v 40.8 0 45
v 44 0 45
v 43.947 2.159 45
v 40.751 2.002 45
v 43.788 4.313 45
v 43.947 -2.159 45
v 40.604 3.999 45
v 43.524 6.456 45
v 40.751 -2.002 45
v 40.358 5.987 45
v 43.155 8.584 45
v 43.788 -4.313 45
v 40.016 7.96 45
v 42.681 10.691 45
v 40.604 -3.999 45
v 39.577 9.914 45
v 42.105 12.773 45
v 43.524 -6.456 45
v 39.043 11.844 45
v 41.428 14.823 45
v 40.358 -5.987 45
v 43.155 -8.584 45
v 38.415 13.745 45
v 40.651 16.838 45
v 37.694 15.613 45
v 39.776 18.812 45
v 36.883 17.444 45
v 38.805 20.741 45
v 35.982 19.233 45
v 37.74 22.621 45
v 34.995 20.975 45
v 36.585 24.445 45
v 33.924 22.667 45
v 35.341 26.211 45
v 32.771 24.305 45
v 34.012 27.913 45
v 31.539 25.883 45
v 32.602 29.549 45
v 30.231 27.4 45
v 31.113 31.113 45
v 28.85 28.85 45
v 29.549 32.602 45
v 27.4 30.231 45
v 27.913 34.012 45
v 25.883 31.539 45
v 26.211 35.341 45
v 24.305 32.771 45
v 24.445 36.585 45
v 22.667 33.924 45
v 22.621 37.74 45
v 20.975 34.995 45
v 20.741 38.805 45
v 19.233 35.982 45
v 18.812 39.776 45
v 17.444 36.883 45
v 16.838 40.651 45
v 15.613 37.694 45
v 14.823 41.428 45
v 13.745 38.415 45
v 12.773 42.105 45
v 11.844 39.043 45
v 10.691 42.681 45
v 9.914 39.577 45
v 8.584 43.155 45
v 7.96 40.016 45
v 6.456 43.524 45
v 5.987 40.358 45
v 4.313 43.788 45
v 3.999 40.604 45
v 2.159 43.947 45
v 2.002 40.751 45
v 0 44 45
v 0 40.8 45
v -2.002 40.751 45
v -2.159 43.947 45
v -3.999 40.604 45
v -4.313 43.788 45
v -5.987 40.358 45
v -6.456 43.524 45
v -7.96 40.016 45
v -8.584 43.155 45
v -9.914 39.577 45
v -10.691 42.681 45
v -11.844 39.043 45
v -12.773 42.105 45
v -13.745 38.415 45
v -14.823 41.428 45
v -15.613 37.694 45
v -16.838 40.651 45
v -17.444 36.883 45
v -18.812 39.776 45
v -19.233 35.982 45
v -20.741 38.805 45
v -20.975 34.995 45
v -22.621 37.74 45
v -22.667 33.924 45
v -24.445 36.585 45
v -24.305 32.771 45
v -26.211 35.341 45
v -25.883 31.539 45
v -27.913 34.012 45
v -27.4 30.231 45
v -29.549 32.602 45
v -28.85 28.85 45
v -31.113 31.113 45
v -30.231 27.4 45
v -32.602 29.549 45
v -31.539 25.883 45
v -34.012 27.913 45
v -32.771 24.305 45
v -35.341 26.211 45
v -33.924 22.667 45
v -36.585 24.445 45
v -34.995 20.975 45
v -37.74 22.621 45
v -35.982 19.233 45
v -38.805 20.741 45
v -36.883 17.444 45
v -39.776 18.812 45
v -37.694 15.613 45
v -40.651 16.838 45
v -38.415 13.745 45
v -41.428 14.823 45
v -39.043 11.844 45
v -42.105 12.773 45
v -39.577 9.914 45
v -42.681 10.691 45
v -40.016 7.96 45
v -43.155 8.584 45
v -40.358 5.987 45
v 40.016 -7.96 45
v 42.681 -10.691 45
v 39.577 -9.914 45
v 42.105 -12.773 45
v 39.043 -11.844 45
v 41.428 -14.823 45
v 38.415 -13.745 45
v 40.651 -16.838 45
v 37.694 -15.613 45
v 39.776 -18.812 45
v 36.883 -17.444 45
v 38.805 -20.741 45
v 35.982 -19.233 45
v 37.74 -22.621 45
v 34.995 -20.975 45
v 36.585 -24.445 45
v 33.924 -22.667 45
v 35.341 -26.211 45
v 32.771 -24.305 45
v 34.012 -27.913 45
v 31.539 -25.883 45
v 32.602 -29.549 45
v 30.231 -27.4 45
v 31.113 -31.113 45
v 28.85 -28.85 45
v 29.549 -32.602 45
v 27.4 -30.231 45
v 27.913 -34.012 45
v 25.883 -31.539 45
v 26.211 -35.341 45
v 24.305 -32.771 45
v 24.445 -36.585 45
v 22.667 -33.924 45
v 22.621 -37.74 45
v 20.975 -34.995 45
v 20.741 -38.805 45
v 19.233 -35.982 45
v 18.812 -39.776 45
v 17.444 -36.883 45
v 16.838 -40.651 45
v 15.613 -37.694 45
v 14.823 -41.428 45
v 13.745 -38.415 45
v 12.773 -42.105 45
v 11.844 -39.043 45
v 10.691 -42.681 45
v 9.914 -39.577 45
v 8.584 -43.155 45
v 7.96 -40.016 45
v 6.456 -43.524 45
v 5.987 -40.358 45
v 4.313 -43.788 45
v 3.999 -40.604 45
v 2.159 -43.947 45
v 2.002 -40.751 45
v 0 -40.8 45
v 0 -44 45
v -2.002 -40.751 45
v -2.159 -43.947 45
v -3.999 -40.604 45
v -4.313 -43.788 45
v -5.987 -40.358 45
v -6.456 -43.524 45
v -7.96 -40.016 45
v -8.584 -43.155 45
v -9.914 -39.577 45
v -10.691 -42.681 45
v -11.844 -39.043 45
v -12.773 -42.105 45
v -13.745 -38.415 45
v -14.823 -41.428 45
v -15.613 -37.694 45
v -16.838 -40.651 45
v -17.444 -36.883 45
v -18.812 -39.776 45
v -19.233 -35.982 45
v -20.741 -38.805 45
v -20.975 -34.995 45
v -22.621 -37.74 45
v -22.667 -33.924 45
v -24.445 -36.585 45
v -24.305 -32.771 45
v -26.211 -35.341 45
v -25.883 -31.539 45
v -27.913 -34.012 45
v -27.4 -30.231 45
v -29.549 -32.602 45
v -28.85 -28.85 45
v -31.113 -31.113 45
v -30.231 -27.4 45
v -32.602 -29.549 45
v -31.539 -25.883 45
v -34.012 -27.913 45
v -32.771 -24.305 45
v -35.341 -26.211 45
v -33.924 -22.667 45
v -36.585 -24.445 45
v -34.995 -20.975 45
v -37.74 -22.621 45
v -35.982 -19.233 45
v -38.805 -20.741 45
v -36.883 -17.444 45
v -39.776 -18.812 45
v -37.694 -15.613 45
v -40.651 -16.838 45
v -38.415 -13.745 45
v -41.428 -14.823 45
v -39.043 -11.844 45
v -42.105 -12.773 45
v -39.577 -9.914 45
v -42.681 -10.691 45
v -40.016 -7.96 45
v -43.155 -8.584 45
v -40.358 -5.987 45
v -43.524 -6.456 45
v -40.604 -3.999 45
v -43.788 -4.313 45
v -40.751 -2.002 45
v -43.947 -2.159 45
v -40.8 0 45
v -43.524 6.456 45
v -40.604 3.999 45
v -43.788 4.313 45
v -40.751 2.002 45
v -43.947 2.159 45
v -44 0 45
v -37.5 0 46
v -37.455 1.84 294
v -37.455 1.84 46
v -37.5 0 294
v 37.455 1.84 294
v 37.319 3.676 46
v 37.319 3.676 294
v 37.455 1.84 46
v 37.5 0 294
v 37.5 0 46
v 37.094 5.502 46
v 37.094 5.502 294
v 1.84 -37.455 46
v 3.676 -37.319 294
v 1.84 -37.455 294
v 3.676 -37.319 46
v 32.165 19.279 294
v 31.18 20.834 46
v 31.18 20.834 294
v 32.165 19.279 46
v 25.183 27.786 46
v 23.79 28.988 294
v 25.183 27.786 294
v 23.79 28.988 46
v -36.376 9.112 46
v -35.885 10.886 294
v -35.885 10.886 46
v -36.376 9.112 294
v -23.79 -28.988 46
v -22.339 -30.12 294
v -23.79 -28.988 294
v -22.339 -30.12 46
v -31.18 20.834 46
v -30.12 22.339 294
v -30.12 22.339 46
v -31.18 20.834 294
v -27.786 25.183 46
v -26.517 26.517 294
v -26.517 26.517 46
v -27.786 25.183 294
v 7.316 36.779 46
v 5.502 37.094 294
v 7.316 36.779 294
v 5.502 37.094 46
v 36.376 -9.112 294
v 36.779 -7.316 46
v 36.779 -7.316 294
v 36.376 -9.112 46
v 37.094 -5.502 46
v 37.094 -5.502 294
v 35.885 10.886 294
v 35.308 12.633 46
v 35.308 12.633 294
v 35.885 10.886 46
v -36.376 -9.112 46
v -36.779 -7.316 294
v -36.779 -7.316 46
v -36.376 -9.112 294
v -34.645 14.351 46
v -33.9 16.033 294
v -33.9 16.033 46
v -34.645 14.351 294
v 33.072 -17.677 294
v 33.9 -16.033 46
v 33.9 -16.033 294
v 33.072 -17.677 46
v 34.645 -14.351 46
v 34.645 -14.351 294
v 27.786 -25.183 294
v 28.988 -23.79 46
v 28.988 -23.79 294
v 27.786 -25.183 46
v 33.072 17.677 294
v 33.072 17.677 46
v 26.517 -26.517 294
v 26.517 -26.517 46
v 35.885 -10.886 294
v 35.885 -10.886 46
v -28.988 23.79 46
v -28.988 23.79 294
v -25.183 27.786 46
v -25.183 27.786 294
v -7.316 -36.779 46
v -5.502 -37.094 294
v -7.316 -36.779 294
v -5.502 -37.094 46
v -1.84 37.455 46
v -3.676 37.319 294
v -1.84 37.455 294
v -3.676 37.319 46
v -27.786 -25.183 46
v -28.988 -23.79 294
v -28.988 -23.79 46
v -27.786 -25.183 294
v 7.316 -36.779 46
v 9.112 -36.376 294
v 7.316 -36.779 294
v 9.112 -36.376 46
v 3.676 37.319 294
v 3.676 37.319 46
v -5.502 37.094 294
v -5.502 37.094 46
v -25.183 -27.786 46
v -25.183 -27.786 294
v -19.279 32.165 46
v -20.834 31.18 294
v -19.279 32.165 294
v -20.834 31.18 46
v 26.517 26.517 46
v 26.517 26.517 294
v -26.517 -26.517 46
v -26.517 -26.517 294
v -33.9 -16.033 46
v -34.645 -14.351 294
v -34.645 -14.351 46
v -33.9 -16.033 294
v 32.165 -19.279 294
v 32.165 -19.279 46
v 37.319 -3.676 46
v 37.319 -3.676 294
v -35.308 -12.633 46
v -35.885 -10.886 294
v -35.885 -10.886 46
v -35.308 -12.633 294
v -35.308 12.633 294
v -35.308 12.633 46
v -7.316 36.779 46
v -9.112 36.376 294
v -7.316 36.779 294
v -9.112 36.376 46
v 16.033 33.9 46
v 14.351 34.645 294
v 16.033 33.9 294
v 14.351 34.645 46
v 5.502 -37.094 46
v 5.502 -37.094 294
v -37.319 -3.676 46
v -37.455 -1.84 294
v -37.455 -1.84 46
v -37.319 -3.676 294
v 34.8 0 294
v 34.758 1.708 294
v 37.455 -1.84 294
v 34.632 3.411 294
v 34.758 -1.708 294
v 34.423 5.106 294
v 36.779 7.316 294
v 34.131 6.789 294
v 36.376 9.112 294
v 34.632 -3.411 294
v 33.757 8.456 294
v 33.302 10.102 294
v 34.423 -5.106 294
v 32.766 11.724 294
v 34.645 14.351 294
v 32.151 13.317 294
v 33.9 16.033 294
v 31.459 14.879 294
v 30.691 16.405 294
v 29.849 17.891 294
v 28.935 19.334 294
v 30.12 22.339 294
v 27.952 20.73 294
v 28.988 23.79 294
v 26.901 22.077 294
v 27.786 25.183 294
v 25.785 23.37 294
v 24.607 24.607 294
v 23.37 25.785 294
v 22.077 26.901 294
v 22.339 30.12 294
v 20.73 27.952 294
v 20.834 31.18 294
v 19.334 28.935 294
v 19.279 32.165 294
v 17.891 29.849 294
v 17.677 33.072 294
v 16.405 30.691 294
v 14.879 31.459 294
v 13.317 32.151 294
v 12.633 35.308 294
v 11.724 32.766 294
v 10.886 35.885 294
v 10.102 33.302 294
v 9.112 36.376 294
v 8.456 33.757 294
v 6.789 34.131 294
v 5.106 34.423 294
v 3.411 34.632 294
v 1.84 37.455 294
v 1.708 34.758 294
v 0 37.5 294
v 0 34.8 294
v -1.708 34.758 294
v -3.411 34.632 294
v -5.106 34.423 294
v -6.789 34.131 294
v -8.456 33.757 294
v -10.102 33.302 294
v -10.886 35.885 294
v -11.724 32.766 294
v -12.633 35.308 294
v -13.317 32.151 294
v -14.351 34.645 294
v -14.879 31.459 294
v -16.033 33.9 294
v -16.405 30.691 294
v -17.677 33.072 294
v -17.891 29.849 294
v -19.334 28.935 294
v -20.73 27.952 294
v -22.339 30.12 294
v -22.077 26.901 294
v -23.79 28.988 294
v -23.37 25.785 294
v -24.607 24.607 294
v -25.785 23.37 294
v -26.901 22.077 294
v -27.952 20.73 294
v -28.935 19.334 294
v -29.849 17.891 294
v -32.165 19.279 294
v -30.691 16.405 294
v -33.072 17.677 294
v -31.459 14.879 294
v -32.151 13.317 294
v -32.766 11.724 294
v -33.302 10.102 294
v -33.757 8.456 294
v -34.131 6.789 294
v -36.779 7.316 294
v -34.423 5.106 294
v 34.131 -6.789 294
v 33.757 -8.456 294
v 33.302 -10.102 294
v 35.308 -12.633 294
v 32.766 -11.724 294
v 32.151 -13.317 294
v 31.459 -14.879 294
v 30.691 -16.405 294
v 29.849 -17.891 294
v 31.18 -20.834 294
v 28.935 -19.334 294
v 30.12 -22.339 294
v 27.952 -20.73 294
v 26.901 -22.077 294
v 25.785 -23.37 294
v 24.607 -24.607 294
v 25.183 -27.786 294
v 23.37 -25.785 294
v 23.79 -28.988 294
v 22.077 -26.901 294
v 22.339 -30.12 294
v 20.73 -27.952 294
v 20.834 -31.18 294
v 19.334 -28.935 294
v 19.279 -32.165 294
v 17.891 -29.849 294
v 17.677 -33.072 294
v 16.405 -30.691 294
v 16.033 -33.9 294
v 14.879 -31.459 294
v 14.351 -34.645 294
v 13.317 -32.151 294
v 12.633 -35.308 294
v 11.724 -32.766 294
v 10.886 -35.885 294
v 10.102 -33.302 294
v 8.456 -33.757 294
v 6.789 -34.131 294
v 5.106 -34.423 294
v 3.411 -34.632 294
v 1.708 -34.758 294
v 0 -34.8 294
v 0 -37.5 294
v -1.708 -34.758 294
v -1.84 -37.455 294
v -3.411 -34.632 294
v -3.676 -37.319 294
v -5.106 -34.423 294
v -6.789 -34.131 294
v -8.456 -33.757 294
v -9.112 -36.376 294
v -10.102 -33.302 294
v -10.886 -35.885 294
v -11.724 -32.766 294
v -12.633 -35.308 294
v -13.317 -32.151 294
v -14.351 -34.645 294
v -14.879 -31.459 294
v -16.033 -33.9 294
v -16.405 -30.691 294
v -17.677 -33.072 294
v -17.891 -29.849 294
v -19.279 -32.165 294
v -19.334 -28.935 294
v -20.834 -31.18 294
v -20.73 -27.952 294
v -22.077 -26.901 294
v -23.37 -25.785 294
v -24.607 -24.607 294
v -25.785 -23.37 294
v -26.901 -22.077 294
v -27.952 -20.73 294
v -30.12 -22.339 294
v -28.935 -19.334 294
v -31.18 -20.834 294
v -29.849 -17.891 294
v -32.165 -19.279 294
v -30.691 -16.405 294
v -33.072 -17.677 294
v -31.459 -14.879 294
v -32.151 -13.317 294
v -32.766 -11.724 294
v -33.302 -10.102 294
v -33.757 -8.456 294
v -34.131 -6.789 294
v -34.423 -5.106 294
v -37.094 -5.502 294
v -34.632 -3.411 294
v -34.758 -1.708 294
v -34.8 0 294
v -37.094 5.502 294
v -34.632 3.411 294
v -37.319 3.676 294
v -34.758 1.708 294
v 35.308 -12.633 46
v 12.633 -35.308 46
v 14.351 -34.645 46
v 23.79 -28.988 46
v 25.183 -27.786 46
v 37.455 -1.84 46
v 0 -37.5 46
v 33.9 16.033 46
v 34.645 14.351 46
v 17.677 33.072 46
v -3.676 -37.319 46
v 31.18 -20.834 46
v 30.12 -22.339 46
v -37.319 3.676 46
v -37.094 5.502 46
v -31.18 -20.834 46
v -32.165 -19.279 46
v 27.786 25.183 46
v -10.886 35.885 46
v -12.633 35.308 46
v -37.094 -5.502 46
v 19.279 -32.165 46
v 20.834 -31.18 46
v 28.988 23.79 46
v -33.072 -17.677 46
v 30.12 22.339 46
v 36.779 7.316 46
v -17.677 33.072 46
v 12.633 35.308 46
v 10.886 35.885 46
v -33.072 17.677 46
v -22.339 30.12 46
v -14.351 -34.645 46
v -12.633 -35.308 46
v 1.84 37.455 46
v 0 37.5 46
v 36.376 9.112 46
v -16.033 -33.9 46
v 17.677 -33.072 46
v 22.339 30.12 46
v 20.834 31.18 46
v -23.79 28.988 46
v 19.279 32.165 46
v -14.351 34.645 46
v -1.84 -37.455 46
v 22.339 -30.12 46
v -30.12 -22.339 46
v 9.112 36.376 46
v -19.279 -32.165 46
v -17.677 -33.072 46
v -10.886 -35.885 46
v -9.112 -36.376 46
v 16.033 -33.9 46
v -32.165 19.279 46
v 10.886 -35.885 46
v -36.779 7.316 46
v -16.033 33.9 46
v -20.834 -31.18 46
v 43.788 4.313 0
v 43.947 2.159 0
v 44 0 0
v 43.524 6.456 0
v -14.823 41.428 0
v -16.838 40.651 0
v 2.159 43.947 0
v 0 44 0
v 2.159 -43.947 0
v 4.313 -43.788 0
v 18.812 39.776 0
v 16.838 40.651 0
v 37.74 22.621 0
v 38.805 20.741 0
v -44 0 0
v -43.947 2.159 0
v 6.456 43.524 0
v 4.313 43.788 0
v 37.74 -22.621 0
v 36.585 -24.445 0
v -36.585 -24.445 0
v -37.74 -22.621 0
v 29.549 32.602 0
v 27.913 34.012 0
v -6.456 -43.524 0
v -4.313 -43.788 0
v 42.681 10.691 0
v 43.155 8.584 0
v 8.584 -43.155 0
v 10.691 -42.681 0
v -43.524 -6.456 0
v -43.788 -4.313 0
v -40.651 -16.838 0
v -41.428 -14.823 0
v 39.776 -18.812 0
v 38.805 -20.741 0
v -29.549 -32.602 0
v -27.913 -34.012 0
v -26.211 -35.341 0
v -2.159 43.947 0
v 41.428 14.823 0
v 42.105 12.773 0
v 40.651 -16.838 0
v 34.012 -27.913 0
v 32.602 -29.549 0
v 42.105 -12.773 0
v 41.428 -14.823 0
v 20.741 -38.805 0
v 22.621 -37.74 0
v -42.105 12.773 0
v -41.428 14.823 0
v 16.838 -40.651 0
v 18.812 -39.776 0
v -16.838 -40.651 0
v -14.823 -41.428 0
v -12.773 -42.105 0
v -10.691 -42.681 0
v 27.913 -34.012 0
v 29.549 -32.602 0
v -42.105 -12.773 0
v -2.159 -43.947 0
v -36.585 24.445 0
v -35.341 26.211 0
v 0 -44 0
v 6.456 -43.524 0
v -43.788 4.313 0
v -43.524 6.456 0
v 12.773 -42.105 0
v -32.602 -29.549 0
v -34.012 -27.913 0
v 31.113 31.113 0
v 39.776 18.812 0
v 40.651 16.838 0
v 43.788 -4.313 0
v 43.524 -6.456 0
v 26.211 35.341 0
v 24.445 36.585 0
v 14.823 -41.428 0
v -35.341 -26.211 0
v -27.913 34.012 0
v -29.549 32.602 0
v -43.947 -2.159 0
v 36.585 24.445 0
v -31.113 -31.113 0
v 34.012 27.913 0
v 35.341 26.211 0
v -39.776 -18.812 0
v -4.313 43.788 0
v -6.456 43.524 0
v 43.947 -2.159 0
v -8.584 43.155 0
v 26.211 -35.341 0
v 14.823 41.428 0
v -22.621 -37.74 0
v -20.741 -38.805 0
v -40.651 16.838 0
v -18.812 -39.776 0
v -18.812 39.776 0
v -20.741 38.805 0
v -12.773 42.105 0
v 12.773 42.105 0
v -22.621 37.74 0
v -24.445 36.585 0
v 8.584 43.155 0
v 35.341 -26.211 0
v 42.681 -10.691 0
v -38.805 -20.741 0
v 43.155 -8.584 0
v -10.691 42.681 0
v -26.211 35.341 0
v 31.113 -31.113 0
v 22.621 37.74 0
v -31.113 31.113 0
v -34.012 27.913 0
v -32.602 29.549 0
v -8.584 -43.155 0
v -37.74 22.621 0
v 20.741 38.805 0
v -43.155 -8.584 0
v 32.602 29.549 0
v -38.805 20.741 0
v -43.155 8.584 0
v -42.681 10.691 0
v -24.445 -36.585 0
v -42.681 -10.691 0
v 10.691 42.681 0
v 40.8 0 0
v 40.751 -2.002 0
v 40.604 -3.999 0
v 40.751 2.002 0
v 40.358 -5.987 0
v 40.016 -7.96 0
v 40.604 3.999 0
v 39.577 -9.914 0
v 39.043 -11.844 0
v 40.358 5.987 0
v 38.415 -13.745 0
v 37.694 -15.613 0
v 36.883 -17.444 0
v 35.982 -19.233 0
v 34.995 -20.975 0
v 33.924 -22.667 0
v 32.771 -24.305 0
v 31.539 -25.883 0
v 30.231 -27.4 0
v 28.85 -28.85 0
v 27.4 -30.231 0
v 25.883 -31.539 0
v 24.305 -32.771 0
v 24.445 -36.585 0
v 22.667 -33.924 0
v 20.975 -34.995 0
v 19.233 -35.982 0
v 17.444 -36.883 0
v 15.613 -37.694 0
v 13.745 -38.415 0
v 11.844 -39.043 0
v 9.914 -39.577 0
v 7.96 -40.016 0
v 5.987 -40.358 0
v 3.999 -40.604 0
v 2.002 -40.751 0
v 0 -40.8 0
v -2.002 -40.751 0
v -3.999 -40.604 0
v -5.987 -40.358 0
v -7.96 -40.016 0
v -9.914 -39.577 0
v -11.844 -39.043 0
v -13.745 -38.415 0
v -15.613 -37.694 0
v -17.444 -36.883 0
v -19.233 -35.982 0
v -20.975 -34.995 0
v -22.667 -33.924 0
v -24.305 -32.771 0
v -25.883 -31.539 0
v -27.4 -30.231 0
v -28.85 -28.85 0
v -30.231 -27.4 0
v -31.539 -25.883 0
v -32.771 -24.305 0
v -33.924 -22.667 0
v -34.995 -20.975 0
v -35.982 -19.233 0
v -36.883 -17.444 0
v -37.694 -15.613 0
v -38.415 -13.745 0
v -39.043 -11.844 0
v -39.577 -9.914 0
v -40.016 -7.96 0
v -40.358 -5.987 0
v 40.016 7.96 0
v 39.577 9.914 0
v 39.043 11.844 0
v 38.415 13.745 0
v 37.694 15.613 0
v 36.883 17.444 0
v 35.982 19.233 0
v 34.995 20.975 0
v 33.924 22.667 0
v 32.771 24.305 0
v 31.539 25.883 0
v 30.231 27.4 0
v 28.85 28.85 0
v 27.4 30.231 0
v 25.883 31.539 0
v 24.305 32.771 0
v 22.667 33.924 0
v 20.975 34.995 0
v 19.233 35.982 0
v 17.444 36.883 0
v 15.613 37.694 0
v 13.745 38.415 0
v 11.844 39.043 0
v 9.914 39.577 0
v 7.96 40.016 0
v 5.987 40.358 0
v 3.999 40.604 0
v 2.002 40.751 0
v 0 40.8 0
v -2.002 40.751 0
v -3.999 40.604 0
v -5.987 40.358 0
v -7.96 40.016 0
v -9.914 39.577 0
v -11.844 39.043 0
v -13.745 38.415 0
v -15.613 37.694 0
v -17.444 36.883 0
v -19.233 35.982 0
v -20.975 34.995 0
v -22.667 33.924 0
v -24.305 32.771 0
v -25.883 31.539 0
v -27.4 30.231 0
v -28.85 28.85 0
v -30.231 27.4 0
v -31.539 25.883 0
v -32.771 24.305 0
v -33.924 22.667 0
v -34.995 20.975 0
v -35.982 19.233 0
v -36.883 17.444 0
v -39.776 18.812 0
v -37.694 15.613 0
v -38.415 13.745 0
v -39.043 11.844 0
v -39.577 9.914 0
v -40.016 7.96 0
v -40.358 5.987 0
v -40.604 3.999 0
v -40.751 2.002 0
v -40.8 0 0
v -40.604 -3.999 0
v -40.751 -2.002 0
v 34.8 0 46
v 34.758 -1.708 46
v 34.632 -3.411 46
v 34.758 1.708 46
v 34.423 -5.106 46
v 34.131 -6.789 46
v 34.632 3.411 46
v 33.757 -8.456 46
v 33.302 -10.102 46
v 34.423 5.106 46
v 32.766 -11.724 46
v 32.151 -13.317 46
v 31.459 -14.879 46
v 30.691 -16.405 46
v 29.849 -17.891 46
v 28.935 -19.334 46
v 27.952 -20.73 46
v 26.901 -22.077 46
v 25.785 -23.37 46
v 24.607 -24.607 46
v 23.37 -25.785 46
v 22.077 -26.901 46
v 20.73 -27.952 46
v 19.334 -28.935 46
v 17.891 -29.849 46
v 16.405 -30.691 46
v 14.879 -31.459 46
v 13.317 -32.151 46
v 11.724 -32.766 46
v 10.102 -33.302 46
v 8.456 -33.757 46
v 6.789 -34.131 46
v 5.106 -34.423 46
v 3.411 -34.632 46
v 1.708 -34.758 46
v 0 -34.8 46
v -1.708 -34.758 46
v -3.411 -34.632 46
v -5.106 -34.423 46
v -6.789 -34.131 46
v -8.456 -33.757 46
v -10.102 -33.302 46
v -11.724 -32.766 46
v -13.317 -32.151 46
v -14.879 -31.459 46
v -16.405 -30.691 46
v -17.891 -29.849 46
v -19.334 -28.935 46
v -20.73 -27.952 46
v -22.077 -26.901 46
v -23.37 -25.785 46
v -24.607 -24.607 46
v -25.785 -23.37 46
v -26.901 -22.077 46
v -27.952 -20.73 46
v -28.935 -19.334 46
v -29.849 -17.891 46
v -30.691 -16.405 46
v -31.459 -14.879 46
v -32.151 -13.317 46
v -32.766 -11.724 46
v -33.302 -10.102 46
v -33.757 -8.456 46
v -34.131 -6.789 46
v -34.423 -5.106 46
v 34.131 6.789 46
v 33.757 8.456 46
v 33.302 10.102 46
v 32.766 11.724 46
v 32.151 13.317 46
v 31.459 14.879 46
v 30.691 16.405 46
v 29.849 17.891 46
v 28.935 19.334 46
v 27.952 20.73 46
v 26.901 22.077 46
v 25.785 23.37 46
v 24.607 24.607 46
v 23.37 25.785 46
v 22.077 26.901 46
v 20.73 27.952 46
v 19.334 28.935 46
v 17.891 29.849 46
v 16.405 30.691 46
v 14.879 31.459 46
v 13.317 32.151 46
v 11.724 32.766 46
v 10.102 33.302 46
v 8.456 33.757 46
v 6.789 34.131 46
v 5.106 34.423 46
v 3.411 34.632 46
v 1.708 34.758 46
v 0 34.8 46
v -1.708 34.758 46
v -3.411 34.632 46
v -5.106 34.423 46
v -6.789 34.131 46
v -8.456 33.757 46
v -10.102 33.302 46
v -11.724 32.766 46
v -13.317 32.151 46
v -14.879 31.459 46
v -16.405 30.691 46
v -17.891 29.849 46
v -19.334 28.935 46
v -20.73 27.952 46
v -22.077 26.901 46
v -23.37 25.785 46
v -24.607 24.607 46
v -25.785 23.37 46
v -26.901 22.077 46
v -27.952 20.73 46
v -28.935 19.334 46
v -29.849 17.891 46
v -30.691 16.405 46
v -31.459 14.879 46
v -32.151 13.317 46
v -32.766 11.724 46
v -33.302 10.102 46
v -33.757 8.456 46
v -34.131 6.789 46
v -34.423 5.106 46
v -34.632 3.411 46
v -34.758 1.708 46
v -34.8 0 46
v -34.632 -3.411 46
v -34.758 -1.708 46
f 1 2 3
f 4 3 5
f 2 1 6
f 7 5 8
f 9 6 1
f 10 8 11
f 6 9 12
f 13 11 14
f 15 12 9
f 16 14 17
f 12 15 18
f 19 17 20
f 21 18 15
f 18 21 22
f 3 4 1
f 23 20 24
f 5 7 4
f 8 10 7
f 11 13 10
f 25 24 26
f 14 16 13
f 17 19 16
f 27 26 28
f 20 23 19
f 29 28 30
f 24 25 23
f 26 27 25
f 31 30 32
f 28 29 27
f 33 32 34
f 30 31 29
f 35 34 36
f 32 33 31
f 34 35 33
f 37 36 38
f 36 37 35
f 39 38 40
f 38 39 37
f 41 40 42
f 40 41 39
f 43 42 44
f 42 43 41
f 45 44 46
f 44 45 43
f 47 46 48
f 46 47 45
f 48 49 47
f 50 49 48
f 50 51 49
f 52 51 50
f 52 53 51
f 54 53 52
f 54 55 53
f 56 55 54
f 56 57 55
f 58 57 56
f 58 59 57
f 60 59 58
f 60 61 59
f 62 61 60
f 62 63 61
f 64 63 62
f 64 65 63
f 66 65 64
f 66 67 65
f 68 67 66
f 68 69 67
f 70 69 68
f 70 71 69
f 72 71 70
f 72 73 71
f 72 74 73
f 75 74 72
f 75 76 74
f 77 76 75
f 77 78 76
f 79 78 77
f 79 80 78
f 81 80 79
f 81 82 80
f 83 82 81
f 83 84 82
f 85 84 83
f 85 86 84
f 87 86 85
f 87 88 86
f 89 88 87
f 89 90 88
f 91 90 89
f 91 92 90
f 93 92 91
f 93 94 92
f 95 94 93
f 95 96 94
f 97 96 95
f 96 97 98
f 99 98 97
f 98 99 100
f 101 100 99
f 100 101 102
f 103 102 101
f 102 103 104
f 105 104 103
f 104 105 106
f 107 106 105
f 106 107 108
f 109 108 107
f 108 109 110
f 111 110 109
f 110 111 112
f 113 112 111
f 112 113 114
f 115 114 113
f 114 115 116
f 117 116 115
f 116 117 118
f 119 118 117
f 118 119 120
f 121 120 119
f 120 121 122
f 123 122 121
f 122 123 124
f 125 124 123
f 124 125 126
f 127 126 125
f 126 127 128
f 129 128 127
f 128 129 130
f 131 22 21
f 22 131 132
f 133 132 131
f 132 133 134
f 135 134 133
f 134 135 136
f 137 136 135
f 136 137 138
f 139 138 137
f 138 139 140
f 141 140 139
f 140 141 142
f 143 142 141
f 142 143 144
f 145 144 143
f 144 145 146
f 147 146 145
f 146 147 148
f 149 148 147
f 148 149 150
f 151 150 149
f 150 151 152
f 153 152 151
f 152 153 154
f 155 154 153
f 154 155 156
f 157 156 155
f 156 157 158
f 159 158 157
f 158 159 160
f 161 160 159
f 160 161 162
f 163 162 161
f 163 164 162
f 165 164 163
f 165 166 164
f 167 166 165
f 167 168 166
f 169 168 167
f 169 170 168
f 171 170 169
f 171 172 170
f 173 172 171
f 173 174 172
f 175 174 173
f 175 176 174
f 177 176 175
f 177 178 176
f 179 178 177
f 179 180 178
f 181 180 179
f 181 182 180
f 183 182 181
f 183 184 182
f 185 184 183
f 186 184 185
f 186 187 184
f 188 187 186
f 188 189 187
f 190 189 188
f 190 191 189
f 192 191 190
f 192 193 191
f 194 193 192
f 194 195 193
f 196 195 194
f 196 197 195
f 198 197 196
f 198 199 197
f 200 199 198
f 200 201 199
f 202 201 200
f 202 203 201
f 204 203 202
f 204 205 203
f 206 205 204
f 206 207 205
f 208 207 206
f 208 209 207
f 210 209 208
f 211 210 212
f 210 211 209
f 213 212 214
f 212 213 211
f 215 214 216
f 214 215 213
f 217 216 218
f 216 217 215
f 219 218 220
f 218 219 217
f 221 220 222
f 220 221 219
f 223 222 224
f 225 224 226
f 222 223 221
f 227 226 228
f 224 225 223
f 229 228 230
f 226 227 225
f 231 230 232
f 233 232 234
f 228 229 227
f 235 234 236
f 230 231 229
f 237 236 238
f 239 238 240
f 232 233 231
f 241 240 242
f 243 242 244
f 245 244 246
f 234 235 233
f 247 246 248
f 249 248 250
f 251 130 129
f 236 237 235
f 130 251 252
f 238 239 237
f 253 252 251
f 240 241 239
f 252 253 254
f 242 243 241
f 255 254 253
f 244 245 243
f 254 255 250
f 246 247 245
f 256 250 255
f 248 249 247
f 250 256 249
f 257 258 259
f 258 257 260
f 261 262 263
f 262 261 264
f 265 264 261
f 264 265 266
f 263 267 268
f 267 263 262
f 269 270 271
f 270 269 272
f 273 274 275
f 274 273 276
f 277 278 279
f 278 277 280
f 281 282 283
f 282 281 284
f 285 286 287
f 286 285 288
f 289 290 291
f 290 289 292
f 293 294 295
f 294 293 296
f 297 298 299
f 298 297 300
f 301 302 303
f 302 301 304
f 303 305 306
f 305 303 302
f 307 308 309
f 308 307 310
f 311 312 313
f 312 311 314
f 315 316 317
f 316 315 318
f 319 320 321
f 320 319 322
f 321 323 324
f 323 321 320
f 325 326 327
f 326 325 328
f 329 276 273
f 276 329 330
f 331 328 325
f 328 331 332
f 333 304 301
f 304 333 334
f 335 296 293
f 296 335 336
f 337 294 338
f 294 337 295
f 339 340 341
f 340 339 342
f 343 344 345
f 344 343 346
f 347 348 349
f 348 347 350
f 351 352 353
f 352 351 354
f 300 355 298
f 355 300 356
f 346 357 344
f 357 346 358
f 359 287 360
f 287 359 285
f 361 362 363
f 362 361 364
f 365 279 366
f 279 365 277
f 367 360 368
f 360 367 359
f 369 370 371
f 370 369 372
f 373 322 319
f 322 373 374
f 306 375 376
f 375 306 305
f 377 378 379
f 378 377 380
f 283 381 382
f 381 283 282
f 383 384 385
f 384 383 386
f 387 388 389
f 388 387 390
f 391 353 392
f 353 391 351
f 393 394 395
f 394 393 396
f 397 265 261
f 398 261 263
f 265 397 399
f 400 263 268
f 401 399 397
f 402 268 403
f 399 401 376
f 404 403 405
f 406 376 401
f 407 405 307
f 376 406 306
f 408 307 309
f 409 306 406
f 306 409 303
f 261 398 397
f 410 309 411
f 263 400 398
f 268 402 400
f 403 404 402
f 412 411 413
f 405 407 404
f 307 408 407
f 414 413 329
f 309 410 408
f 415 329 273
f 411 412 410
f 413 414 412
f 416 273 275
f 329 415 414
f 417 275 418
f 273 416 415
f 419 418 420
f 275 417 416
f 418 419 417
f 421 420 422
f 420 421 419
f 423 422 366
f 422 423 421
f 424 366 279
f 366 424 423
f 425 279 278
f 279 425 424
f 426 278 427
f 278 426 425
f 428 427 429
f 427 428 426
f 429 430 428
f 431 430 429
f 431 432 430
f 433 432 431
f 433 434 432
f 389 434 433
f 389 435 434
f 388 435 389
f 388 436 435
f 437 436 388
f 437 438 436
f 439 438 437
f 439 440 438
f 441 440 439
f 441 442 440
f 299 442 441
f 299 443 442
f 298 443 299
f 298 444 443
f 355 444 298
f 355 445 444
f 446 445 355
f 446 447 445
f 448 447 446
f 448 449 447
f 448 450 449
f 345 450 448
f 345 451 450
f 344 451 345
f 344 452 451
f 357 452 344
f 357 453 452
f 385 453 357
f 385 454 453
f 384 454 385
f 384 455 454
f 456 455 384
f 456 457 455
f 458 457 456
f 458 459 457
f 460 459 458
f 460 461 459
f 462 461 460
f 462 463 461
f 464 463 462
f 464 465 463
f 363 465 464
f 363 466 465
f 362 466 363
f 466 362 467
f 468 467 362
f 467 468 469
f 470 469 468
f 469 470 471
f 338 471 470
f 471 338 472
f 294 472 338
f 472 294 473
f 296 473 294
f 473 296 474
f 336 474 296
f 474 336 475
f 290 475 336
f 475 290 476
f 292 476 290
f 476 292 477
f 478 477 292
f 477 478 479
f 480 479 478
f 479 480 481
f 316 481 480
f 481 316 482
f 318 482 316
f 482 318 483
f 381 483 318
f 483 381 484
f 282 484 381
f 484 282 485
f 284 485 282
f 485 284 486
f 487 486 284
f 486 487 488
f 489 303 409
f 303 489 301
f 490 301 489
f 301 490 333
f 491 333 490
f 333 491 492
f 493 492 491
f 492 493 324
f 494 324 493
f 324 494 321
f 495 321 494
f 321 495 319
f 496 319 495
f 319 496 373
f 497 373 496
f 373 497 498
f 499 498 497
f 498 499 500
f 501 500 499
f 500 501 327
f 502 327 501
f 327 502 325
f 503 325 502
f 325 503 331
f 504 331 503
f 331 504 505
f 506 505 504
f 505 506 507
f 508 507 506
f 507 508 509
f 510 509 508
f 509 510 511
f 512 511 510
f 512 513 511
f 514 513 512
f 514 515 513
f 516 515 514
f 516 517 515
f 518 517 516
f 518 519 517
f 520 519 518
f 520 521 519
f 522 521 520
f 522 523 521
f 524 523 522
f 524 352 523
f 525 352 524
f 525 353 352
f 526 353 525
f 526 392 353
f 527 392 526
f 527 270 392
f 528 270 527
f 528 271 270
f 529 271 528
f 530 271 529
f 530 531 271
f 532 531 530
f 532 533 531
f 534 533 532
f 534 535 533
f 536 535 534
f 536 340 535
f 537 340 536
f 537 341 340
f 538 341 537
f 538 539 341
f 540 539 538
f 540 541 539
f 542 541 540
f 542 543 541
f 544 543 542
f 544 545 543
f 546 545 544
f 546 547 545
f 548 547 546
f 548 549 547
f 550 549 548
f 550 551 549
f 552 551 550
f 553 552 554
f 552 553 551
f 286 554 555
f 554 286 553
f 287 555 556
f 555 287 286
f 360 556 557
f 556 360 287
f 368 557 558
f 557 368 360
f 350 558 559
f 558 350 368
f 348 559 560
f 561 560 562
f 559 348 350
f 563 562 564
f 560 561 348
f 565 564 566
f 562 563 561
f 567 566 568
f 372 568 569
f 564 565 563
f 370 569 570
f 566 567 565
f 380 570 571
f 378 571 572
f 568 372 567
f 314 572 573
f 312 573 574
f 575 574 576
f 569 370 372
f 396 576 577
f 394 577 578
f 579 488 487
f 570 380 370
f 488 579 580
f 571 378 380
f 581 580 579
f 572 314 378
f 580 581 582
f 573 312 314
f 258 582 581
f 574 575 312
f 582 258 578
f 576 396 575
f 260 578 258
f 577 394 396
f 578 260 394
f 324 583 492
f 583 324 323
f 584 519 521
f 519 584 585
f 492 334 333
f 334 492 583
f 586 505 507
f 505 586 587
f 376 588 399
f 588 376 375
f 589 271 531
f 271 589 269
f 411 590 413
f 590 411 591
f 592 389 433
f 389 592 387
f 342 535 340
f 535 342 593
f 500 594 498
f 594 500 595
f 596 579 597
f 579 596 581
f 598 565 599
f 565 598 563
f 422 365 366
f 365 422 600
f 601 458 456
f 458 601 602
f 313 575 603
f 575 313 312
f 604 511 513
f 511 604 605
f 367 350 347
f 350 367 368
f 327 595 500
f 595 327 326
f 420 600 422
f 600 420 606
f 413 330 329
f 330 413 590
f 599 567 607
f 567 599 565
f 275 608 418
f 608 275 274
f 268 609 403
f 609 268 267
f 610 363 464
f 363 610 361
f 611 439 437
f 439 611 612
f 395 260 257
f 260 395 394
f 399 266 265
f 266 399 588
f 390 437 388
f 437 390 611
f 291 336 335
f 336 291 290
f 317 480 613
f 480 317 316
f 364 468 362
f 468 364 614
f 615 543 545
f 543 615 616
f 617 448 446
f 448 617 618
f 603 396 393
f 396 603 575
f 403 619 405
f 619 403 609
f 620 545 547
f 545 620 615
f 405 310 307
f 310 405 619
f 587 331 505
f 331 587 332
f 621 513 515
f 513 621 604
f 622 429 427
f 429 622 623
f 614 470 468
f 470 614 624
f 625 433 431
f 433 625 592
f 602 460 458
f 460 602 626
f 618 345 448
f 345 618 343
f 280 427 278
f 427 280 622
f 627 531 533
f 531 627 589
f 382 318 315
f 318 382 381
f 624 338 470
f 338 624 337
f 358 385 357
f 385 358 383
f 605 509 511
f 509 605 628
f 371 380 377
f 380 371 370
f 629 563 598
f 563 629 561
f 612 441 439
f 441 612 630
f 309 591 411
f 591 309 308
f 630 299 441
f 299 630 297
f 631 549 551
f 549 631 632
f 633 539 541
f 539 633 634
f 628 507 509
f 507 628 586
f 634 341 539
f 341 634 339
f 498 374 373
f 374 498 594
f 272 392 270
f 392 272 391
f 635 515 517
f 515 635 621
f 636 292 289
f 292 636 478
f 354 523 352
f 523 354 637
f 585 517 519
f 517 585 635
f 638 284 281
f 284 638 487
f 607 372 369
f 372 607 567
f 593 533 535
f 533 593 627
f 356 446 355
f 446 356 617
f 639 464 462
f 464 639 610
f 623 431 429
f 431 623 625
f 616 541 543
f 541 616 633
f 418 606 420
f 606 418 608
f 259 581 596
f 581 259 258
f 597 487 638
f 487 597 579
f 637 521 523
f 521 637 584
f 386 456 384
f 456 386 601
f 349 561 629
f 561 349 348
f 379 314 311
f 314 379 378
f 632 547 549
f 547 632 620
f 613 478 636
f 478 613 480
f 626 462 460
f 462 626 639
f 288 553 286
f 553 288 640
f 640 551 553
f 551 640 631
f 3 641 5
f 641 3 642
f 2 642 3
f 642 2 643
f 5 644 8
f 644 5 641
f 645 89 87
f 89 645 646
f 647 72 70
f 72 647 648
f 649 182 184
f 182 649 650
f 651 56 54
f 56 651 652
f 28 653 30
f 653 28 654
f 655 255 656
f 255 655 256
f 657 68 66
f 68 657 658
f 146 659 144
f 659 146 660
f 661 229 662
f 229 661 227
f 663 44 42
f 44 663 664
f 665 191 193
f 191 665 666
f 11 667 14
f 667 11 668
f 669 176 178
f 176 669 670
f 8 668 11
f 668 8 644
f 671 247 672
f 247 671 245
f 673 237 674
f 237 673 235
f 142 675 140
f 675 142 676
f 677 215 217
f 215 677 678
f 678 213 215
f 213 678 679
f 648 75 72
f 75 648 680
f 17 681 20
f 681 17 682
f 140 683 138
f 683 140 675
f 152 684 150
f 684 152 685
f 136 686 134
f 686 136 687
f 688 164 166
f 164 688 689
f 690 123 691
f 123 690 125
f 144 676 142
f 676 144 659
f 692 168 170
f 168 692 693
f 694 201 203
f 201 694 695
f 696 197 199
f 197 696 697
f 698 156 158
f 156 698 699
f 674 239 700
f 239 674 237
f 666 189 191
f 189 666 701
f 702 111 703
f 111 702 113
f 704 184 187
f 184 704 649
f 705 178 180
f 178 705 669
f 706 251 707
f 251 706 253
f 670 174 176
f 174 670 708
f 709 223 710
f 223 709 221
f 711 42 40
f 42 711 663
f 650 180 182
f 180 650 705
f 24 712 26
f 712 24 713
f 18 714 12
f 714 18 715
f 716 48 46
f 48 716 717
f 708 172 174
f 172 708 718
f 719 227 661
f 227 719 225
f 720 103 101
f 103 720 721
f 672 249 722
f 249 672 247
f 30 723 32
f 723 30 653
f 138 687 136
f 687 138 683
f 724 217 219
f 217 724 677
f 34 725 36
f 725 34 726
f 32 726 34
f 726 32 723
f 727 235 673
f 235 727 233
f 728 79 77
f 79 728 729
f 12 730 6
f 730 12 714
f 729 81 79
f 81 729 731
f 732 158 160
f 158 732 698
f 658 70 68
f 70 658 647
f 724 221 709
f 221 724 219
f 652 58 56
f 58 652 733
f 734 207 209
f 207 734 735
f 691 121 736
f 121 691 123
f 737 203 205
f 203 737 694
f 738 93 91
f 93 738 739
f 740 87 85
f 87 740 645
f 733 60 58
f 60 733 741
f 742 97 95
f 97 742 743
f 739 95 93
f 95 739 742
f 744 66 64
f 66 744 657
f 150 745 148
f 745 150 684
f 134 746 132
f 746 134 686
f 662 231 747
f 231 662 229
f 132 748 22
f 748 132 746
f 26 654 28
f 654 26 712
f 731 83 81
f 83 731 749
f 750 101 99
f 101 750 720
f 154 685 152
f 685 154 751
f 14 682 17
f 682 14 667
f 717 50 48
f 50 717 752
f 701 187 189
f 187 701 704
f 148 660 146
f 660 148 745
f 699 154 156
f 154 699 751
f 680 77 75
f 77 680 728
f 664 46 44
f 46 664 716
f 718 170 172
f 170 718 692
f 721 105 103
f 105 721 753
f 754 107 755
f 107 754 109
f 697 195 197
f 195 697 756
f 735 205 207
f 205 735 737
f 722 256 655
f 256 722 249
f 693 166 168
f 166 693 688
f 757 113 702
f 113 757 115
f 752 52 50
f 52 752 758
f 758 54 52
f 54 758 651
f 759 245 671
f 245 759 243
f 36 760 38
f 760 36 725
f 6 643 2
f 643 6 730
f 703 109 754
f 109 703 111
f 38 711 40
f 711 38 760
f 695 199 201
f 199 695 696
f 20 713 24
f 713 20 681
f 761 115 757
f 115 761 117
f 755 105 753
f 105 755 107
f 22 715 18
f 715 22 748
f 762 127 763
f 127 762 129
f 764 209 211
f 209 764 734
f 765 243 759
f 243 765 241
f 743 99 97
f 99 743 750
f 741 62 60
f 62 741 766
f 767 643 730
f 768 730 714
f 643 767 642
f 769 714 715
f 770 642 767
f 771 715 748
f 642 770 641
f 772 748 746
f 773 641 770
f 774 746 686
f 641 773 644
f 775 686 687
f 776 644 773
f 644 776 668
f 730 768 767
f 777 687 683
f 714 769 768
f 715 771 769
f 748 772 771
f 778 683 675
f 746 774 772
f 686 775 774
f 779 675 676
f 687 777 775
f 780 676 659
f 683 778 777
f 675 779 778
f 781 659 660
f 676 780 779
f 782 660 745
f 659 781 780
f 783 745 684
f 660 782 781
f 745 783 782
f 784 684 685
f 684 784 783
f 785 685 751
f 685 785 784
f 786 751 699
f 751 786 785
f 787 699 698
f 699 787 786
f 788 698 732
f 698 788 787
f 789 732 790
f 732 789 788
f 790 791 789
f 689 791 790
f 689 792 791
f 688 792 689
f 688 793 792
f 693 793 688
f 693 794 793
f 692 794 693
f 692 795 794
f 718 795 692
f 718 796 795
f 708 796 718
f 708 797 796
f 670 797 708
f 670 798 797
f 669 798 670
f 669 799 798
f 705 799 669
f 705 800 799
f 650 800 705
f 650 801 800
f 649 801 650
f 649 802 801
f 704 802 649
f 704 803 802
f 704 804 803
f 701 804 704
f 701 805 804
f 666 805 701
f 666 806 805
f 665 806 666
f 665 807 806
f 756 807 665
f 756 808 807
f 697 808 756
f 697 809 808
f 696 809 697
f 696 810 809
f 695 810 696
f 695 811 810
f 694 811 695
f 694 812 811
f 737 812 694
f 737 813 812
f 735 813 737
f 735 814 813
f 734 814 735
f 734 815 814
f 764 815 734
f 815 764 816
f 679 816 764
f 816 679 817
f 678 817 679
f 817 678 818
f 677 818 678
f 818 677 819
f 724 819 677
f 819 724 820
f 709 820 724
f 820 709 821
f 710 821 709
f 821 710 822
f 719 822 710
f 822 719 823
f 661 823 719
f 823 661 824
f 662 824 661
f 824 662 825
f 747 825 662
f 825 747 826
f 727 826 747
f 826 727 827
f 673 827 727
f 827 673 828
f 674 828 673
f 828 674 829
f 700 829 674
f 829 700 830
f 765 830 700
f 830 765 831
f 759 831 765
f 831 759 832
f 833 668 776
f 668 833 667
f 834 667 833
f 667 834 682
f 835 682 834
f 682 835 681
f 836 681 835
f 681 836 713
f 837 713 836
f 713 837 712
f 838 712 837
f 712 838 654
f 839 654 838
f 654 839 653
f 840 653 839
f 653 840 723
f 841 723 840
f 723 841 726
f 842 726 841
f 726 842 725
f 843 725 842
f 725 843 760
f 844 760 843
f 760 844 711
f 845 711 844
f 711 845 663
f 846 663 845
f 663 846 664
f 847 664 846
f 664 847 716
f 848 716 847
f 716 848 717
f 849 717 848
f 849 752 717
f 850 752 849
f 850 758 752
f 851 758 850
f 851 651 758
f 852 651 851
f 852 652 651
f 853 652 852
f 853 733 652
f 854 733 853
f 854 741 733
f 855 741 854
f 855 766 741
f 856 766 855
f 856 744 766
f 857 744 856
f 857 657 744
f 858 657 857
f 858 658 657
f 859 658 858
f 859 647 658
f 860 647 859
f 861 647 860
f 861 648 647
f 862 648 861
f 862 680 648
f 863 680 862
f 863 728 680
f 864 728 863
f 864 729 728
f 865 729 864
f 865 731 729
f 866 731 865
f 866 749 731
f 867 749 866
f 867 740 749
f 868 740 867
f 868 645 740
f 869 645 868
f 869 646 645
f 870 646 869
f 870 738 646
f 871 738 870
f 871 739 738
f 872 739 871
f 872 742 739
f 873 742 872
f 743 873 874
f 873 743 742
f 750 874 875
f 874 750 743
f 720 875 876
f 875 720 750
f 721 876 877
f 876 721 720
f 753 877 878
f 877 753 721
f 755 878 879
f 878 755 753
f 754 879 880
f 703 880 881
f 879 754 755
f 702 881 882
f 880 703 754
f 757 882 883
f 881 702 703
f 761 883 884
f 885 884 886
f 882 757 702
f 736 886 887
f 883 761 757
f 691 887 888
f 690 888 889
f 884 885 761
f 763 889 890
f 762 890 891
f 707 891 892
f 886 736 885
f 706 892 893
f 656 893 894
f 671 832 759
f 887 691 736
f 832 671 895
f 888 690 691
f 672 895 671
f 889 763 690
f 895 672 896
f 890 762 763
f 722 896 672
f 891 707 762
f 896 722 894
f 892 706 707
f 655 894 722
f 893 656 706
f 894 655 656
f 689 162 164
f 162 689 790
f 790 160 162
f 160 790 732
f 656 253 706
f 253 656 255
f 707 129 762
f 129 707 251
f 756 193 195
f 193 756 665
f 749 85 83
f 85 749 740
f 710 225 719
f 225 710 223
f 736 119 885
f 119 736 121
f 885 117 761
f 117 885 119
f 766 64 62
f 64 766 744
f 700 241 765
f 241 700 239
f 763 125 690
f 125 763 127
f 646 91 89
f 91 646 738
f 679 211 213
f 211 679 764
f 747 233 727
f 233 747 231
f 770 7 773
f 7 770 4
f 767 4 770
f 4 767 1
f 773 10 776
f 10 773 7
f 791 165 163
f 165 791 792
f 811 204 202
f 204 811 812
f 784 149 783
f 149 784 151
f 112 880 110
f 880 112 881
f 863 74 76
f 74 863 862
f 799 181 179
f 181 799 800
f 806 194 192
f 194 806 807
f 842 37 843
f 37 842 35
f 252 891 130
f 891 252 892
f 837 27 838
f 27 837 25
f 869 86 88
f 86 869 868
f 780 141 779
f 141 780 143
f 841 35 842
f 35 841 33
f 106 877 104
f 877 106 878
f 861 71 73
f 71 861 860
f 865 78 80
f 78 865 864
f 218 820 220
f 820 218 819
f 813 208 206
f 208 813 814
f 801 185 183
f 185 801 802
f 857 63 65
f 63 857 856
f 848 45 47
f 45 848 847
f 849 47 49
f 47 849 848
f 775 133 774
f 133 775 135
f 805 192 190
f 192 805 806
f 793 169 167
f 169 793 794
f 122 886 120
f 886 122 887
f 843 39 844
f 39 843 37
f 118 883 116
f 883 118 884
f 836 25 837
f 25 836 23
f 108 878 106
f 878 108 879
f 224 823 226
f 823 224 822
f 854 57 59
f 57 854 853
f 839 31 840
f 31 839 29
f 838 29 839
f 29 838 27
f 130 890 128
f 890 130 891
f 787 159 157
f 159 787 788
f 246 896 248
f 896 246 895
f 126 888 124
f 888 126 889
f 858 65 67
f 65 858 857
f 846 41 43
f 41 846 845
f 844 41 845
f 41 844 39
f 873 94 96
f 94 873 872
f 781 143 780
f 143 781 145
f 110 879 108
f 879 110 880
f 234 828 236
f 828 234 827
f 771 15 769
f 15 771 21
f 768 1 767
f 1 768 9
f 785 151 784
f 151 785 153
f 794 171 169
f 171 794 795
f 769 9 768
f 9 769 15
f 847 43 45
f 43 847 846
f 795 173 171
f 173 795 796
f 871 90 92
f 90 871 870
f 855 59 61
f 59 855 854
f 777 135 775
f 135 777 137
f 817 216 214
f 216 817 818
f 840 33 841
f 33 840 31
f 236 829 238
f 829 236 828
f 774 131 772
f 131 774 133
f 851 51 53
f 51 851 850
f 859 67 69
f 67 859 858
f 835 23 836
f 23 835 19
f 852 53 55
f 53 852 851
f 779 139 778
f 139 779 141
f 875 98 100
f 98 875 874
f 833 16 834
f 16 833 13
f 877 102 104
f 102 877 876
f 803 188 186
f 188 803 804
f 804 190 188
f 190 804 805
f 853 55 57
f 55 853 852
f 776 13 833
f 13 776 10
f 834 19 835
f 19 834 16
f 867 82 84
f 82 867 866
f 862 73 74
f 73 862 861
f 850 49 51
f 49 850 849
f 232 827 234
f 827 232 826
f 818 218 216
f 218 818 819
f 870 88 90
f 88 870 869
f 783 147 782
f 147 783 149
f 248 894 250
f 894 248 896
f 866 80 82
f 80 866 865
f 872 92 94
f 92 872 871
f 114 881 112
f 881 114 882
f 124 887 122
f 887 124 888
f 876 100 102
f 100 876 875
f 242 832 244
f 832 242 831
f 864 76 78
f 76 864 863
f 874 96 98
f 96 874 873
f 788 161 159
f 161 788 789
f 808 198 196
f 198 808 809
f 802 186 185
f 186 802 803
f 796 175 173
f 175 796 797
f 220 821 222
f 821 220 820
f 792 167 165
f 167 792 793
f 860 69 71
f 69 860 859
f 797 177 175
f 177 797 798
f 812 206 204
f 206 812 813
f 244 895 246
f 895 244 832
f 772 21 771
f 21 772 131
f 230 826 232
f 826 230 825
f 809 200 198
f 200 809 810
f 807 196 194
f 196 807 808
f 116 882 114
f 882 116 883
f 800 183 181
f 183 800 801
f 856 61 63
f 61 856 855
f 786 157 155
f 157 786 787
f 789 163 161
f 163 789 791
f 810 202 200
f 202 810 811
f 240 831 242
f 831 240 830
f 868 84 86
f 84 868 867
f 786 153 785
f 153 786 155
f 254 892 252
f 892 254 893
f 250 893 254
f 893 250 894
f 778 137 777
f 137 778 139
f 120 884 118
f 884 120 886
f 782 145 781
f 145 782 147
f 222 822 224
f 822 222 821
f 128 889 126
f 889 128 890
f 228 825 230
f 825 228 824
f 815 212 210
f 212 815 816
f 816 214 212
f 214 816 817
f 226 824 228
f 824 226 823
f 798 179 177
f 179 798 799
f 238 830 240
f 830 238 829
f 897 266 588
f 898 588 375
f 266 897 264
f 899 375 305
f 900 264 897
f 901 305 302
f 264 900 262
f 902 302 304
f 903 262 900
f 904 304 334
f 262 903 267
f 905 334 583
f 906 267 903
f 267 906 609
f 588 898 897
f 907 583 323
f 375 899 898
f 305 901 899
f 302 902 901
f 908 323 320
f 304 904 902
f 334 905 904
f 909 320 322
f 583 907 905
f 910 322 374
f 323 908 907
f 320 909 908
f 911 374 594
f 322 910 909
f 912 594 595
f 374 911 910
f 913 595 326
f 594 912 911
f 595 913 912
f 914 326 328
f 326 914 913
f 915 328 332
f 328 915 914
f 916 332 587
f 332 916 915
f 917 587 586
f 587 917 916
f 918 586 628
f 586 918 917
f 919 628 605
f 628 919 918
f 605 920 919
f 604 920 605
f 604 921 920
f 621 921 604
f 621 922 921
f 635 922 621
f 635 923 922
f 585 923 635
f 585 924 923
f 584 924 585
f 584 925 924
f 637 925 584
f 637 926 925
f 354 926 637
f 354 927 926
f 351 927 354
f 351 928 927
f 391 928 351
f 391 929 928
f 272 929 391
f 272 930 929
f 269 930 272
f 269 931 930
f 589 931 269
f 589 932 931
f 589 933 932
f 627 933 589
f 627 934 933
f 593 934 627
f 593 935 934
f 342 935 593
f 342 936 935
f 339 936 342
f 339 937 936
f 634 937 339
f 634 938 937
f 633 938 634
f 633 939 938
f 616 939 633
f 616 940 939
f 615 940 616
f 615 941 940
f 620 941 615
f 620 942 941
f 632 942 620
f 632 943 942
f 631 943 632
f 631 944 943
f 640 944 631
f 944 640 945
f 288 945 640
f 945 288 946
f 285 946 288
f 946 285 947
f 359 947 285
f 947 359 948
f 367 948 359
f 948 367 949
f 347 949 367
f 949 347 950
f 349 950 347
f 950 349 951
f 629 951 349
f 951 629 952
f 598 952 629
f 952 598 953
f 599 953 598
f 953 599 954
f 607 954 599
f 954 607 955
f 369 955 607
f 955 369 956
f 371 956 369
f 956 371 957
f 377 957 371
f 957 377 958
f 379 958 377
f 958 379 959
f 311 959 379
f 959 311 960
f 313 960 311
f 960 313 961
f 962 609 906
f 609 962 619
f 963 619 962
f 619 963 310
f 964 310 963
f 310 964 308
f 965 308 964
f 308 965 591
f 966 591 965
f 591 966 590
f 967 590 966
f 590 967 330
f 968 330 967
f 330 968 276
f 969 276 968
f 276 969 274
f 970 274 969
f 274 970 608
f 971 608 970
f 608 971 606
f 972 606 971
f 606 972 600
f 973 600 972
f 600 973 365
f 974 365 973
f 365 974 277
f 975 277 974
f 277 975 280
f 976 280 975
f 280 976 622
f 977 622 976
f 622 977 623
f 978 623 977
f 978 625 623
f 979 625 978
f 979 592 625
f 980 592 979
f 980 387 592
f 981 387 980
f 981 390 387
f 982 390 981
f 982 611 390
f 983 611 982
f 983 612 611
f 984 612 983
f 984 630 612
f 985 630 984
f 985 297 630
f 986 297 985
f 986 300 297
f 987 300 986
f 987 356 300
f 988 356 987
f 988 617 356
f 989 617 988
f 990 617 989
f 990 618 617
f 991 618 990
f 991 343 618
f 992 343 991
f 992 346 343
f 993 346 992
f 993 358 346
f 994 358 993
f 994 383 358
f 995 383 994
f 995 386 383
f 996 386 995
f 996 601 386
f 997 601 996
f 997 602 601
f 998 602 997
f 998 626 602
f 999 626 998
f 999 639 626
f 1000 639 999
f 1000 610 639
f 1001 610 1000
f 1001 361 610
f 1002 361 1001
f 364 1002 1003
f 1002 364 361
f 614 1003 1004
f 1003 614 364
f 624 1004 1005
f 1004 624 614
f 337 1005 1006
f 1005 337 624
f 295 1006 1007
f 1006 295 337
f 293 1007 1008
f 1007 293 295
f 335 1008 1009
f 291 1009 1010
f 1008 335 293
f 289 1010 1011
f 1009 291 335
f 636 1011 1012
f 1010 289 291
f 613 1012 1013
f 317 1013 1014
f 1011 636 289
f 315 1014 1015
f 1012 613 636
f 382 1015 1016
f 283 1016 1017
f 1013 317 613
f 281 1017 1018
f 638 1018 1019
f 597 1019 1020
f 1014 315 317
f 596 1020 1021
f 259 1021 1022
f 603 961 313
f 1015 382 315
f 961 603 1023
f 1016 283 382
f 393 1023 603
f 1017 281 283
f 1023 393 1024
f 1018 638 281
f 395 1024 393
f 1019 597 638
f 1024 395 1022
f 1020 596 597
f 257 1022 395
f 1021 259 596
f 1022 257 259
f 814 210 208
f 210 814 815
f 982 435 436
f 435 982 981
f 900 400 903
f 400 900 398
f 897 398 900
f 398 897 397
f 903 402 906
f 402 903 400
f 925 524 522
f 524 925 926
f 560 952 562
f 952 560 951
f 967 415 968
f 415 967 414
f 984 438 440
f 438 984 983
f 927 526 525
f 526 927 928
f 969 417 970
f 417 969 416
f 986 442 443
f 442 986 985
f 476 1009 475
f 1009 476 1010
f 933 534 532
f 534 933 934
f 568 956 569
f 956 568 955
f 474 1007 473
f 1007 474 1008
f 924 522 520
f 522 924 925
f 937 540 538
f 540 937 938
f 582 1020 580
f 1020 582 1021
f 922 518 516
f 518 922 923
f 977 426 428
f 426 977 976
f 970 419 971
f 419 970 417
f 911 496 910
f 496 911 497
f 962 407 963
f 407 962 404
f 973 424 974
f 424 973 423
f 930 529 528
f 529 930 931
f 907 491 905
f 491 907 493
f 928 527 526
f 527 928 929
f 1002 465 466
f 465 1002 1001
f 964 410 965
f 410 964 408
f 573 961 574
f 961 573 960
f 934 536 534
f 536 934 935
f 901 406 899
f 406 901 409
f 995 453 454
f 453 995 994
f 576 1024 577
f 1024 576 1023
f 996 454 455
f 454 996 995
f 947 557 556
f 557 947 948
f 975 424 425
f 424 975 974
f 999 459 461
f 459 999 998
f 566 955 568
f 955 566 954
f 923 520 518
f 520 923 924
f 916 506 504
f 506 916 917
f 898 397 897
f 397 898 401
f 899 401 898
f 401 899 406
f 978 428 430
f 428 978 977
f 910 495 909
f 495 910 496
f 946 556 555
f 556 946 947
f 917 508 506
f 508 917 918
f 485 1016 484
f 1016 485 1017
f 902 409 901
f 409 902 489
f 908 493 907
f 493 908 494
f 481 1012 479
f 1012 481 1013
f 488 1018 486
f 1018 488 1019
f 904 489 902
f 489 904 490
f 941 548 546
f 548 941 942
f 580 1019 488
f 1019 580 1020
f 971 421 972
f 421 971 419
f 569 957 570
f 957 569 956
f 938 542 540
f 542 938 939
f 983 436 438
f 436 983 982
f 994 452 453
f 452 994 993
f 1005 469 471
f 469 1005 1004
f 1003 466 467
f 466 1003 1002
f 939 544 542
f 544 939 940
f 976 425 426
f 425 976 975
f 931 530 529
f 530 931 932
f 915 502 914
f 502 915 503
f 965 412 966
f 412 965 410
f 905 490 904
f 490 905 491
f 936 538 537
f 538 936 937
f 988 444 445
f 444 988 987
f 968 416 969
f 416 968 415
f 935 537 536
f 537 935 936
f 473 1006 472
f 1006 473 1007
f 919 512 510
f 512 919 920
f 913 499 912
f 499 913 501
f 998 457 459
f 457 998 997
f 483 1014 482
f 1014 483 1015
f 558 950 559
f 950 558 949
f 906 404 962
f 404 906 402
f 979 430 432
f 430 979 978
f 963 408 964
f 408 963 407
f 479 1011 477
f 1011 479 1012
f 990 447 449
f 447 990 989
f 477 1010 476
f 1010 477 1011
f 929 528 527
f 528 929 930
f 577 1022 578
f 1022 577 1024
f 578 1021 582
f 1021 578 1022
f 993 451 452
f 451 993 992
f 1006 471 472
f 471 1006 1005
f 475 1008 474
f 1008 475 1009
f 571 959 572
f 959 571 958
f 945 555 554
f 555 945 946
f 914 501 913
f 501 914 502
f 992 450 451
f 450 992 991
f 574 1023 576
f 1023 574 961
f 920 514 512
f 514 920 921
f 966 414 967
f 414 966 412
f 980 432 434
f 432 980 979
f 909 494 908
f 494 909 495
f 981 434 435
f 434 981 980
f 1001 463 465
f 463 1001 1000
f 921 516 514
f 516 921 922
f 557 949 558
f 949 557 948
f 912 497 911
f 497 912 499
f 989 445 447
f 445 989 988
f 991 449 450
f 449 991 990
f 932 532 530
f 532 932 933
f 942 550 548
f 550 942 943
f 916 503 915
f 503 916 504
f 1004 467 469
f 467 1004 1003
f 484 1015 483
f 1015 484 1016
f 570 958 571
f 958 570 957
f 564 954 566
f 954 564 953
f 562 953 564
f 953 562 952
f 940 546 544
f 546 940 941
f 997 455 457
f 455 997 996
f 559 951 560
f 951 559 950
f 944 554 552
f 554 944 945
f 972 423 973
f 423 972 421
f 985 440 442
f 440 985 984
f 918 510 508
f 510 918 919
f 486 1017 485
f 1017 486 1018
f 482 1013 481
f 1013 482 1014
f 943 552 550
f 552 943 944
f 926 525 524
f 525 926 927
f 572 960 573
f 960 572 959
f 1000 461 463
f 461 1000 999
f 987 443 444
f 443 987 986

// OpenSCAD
// Parameters
length_mm = 250; //[125:500:1]
ht75_outer_diameter = 75; //[60:90:0.5]
wall_thickness = 2.7; //[1.5:5.4:0.1]
fitting_length = 45; //[25:90:1]
fitting_outer_diameter = 88; //[75:110:0.5]
fitting_wall_thickness = 3.2; //[2:6.4:0.1]
fitting_stop_thickness = 3; //[1:8:0.5]
fitting_stop_length = 6; //[2:15:0.5]
overlap = 1; //[0.5:2:0.1]

$fn = 128;

module ht_pipe() {
  // Derived radii
  pipe_ro = ht75_outer_diameter/2;
  pipe_ri = pipe_ro - wall_thickness;

  sock_ro = fitting_outer_diameter/2;
  sock_ri = sock_ro - fitting_wall_thickness;

  // Ensure stop ring stays within socket wall
  stop_ro = sock_ri;
  stop_ri = max(0.01, sock_ri - fitting_stop_thickness);

  // Place socket at the BOTTOM end (z=0), pipe continues upward
  // One connected solid: union of outer solids, then subtract one continuous inner void.
  color([0.85, 0.85, 0.8])
  difference() {
    union() {
      // Outer pipe
      translate([0, 0, fitting_length - overlap])
        cylinder(h=length_mm, r=pipe_ro, center=false);

      // Outer socket
      cylinder(h=fitting_length, r=sock_ro, center=false);

      // Internal stop ring (solid annulus) inside socket near its top
      translate([0, 0, fitting_length - fitting_stop_length])
        difference() {
          cylinder(h=fitting_stop_length, r=stop_ro, center=false);
          translate([0, 0, -overlap])
            cylinder(h=fitting_stop_length + 2*overlap, r=stop_ri, center=false);
        }
    }

    // Inner void: socket bore + pipe bore, aligned and overlapping to avoid gaps
    union() {
      // Socket inner bore (open at bottom)
      translate([0, 0, -overlap])
        cylinder(h=fitting_length + 2*overlap, r=sock_ri, center=false);

      // Pipe inner bore (continues upward from socket top)
      translate([0, 0, fitting_length - overlap - overlap])
        cylinder(h=length_mm + 2*overlap, r=pipe_ri, center=false);
    }
  }
}

ht_pipe();
